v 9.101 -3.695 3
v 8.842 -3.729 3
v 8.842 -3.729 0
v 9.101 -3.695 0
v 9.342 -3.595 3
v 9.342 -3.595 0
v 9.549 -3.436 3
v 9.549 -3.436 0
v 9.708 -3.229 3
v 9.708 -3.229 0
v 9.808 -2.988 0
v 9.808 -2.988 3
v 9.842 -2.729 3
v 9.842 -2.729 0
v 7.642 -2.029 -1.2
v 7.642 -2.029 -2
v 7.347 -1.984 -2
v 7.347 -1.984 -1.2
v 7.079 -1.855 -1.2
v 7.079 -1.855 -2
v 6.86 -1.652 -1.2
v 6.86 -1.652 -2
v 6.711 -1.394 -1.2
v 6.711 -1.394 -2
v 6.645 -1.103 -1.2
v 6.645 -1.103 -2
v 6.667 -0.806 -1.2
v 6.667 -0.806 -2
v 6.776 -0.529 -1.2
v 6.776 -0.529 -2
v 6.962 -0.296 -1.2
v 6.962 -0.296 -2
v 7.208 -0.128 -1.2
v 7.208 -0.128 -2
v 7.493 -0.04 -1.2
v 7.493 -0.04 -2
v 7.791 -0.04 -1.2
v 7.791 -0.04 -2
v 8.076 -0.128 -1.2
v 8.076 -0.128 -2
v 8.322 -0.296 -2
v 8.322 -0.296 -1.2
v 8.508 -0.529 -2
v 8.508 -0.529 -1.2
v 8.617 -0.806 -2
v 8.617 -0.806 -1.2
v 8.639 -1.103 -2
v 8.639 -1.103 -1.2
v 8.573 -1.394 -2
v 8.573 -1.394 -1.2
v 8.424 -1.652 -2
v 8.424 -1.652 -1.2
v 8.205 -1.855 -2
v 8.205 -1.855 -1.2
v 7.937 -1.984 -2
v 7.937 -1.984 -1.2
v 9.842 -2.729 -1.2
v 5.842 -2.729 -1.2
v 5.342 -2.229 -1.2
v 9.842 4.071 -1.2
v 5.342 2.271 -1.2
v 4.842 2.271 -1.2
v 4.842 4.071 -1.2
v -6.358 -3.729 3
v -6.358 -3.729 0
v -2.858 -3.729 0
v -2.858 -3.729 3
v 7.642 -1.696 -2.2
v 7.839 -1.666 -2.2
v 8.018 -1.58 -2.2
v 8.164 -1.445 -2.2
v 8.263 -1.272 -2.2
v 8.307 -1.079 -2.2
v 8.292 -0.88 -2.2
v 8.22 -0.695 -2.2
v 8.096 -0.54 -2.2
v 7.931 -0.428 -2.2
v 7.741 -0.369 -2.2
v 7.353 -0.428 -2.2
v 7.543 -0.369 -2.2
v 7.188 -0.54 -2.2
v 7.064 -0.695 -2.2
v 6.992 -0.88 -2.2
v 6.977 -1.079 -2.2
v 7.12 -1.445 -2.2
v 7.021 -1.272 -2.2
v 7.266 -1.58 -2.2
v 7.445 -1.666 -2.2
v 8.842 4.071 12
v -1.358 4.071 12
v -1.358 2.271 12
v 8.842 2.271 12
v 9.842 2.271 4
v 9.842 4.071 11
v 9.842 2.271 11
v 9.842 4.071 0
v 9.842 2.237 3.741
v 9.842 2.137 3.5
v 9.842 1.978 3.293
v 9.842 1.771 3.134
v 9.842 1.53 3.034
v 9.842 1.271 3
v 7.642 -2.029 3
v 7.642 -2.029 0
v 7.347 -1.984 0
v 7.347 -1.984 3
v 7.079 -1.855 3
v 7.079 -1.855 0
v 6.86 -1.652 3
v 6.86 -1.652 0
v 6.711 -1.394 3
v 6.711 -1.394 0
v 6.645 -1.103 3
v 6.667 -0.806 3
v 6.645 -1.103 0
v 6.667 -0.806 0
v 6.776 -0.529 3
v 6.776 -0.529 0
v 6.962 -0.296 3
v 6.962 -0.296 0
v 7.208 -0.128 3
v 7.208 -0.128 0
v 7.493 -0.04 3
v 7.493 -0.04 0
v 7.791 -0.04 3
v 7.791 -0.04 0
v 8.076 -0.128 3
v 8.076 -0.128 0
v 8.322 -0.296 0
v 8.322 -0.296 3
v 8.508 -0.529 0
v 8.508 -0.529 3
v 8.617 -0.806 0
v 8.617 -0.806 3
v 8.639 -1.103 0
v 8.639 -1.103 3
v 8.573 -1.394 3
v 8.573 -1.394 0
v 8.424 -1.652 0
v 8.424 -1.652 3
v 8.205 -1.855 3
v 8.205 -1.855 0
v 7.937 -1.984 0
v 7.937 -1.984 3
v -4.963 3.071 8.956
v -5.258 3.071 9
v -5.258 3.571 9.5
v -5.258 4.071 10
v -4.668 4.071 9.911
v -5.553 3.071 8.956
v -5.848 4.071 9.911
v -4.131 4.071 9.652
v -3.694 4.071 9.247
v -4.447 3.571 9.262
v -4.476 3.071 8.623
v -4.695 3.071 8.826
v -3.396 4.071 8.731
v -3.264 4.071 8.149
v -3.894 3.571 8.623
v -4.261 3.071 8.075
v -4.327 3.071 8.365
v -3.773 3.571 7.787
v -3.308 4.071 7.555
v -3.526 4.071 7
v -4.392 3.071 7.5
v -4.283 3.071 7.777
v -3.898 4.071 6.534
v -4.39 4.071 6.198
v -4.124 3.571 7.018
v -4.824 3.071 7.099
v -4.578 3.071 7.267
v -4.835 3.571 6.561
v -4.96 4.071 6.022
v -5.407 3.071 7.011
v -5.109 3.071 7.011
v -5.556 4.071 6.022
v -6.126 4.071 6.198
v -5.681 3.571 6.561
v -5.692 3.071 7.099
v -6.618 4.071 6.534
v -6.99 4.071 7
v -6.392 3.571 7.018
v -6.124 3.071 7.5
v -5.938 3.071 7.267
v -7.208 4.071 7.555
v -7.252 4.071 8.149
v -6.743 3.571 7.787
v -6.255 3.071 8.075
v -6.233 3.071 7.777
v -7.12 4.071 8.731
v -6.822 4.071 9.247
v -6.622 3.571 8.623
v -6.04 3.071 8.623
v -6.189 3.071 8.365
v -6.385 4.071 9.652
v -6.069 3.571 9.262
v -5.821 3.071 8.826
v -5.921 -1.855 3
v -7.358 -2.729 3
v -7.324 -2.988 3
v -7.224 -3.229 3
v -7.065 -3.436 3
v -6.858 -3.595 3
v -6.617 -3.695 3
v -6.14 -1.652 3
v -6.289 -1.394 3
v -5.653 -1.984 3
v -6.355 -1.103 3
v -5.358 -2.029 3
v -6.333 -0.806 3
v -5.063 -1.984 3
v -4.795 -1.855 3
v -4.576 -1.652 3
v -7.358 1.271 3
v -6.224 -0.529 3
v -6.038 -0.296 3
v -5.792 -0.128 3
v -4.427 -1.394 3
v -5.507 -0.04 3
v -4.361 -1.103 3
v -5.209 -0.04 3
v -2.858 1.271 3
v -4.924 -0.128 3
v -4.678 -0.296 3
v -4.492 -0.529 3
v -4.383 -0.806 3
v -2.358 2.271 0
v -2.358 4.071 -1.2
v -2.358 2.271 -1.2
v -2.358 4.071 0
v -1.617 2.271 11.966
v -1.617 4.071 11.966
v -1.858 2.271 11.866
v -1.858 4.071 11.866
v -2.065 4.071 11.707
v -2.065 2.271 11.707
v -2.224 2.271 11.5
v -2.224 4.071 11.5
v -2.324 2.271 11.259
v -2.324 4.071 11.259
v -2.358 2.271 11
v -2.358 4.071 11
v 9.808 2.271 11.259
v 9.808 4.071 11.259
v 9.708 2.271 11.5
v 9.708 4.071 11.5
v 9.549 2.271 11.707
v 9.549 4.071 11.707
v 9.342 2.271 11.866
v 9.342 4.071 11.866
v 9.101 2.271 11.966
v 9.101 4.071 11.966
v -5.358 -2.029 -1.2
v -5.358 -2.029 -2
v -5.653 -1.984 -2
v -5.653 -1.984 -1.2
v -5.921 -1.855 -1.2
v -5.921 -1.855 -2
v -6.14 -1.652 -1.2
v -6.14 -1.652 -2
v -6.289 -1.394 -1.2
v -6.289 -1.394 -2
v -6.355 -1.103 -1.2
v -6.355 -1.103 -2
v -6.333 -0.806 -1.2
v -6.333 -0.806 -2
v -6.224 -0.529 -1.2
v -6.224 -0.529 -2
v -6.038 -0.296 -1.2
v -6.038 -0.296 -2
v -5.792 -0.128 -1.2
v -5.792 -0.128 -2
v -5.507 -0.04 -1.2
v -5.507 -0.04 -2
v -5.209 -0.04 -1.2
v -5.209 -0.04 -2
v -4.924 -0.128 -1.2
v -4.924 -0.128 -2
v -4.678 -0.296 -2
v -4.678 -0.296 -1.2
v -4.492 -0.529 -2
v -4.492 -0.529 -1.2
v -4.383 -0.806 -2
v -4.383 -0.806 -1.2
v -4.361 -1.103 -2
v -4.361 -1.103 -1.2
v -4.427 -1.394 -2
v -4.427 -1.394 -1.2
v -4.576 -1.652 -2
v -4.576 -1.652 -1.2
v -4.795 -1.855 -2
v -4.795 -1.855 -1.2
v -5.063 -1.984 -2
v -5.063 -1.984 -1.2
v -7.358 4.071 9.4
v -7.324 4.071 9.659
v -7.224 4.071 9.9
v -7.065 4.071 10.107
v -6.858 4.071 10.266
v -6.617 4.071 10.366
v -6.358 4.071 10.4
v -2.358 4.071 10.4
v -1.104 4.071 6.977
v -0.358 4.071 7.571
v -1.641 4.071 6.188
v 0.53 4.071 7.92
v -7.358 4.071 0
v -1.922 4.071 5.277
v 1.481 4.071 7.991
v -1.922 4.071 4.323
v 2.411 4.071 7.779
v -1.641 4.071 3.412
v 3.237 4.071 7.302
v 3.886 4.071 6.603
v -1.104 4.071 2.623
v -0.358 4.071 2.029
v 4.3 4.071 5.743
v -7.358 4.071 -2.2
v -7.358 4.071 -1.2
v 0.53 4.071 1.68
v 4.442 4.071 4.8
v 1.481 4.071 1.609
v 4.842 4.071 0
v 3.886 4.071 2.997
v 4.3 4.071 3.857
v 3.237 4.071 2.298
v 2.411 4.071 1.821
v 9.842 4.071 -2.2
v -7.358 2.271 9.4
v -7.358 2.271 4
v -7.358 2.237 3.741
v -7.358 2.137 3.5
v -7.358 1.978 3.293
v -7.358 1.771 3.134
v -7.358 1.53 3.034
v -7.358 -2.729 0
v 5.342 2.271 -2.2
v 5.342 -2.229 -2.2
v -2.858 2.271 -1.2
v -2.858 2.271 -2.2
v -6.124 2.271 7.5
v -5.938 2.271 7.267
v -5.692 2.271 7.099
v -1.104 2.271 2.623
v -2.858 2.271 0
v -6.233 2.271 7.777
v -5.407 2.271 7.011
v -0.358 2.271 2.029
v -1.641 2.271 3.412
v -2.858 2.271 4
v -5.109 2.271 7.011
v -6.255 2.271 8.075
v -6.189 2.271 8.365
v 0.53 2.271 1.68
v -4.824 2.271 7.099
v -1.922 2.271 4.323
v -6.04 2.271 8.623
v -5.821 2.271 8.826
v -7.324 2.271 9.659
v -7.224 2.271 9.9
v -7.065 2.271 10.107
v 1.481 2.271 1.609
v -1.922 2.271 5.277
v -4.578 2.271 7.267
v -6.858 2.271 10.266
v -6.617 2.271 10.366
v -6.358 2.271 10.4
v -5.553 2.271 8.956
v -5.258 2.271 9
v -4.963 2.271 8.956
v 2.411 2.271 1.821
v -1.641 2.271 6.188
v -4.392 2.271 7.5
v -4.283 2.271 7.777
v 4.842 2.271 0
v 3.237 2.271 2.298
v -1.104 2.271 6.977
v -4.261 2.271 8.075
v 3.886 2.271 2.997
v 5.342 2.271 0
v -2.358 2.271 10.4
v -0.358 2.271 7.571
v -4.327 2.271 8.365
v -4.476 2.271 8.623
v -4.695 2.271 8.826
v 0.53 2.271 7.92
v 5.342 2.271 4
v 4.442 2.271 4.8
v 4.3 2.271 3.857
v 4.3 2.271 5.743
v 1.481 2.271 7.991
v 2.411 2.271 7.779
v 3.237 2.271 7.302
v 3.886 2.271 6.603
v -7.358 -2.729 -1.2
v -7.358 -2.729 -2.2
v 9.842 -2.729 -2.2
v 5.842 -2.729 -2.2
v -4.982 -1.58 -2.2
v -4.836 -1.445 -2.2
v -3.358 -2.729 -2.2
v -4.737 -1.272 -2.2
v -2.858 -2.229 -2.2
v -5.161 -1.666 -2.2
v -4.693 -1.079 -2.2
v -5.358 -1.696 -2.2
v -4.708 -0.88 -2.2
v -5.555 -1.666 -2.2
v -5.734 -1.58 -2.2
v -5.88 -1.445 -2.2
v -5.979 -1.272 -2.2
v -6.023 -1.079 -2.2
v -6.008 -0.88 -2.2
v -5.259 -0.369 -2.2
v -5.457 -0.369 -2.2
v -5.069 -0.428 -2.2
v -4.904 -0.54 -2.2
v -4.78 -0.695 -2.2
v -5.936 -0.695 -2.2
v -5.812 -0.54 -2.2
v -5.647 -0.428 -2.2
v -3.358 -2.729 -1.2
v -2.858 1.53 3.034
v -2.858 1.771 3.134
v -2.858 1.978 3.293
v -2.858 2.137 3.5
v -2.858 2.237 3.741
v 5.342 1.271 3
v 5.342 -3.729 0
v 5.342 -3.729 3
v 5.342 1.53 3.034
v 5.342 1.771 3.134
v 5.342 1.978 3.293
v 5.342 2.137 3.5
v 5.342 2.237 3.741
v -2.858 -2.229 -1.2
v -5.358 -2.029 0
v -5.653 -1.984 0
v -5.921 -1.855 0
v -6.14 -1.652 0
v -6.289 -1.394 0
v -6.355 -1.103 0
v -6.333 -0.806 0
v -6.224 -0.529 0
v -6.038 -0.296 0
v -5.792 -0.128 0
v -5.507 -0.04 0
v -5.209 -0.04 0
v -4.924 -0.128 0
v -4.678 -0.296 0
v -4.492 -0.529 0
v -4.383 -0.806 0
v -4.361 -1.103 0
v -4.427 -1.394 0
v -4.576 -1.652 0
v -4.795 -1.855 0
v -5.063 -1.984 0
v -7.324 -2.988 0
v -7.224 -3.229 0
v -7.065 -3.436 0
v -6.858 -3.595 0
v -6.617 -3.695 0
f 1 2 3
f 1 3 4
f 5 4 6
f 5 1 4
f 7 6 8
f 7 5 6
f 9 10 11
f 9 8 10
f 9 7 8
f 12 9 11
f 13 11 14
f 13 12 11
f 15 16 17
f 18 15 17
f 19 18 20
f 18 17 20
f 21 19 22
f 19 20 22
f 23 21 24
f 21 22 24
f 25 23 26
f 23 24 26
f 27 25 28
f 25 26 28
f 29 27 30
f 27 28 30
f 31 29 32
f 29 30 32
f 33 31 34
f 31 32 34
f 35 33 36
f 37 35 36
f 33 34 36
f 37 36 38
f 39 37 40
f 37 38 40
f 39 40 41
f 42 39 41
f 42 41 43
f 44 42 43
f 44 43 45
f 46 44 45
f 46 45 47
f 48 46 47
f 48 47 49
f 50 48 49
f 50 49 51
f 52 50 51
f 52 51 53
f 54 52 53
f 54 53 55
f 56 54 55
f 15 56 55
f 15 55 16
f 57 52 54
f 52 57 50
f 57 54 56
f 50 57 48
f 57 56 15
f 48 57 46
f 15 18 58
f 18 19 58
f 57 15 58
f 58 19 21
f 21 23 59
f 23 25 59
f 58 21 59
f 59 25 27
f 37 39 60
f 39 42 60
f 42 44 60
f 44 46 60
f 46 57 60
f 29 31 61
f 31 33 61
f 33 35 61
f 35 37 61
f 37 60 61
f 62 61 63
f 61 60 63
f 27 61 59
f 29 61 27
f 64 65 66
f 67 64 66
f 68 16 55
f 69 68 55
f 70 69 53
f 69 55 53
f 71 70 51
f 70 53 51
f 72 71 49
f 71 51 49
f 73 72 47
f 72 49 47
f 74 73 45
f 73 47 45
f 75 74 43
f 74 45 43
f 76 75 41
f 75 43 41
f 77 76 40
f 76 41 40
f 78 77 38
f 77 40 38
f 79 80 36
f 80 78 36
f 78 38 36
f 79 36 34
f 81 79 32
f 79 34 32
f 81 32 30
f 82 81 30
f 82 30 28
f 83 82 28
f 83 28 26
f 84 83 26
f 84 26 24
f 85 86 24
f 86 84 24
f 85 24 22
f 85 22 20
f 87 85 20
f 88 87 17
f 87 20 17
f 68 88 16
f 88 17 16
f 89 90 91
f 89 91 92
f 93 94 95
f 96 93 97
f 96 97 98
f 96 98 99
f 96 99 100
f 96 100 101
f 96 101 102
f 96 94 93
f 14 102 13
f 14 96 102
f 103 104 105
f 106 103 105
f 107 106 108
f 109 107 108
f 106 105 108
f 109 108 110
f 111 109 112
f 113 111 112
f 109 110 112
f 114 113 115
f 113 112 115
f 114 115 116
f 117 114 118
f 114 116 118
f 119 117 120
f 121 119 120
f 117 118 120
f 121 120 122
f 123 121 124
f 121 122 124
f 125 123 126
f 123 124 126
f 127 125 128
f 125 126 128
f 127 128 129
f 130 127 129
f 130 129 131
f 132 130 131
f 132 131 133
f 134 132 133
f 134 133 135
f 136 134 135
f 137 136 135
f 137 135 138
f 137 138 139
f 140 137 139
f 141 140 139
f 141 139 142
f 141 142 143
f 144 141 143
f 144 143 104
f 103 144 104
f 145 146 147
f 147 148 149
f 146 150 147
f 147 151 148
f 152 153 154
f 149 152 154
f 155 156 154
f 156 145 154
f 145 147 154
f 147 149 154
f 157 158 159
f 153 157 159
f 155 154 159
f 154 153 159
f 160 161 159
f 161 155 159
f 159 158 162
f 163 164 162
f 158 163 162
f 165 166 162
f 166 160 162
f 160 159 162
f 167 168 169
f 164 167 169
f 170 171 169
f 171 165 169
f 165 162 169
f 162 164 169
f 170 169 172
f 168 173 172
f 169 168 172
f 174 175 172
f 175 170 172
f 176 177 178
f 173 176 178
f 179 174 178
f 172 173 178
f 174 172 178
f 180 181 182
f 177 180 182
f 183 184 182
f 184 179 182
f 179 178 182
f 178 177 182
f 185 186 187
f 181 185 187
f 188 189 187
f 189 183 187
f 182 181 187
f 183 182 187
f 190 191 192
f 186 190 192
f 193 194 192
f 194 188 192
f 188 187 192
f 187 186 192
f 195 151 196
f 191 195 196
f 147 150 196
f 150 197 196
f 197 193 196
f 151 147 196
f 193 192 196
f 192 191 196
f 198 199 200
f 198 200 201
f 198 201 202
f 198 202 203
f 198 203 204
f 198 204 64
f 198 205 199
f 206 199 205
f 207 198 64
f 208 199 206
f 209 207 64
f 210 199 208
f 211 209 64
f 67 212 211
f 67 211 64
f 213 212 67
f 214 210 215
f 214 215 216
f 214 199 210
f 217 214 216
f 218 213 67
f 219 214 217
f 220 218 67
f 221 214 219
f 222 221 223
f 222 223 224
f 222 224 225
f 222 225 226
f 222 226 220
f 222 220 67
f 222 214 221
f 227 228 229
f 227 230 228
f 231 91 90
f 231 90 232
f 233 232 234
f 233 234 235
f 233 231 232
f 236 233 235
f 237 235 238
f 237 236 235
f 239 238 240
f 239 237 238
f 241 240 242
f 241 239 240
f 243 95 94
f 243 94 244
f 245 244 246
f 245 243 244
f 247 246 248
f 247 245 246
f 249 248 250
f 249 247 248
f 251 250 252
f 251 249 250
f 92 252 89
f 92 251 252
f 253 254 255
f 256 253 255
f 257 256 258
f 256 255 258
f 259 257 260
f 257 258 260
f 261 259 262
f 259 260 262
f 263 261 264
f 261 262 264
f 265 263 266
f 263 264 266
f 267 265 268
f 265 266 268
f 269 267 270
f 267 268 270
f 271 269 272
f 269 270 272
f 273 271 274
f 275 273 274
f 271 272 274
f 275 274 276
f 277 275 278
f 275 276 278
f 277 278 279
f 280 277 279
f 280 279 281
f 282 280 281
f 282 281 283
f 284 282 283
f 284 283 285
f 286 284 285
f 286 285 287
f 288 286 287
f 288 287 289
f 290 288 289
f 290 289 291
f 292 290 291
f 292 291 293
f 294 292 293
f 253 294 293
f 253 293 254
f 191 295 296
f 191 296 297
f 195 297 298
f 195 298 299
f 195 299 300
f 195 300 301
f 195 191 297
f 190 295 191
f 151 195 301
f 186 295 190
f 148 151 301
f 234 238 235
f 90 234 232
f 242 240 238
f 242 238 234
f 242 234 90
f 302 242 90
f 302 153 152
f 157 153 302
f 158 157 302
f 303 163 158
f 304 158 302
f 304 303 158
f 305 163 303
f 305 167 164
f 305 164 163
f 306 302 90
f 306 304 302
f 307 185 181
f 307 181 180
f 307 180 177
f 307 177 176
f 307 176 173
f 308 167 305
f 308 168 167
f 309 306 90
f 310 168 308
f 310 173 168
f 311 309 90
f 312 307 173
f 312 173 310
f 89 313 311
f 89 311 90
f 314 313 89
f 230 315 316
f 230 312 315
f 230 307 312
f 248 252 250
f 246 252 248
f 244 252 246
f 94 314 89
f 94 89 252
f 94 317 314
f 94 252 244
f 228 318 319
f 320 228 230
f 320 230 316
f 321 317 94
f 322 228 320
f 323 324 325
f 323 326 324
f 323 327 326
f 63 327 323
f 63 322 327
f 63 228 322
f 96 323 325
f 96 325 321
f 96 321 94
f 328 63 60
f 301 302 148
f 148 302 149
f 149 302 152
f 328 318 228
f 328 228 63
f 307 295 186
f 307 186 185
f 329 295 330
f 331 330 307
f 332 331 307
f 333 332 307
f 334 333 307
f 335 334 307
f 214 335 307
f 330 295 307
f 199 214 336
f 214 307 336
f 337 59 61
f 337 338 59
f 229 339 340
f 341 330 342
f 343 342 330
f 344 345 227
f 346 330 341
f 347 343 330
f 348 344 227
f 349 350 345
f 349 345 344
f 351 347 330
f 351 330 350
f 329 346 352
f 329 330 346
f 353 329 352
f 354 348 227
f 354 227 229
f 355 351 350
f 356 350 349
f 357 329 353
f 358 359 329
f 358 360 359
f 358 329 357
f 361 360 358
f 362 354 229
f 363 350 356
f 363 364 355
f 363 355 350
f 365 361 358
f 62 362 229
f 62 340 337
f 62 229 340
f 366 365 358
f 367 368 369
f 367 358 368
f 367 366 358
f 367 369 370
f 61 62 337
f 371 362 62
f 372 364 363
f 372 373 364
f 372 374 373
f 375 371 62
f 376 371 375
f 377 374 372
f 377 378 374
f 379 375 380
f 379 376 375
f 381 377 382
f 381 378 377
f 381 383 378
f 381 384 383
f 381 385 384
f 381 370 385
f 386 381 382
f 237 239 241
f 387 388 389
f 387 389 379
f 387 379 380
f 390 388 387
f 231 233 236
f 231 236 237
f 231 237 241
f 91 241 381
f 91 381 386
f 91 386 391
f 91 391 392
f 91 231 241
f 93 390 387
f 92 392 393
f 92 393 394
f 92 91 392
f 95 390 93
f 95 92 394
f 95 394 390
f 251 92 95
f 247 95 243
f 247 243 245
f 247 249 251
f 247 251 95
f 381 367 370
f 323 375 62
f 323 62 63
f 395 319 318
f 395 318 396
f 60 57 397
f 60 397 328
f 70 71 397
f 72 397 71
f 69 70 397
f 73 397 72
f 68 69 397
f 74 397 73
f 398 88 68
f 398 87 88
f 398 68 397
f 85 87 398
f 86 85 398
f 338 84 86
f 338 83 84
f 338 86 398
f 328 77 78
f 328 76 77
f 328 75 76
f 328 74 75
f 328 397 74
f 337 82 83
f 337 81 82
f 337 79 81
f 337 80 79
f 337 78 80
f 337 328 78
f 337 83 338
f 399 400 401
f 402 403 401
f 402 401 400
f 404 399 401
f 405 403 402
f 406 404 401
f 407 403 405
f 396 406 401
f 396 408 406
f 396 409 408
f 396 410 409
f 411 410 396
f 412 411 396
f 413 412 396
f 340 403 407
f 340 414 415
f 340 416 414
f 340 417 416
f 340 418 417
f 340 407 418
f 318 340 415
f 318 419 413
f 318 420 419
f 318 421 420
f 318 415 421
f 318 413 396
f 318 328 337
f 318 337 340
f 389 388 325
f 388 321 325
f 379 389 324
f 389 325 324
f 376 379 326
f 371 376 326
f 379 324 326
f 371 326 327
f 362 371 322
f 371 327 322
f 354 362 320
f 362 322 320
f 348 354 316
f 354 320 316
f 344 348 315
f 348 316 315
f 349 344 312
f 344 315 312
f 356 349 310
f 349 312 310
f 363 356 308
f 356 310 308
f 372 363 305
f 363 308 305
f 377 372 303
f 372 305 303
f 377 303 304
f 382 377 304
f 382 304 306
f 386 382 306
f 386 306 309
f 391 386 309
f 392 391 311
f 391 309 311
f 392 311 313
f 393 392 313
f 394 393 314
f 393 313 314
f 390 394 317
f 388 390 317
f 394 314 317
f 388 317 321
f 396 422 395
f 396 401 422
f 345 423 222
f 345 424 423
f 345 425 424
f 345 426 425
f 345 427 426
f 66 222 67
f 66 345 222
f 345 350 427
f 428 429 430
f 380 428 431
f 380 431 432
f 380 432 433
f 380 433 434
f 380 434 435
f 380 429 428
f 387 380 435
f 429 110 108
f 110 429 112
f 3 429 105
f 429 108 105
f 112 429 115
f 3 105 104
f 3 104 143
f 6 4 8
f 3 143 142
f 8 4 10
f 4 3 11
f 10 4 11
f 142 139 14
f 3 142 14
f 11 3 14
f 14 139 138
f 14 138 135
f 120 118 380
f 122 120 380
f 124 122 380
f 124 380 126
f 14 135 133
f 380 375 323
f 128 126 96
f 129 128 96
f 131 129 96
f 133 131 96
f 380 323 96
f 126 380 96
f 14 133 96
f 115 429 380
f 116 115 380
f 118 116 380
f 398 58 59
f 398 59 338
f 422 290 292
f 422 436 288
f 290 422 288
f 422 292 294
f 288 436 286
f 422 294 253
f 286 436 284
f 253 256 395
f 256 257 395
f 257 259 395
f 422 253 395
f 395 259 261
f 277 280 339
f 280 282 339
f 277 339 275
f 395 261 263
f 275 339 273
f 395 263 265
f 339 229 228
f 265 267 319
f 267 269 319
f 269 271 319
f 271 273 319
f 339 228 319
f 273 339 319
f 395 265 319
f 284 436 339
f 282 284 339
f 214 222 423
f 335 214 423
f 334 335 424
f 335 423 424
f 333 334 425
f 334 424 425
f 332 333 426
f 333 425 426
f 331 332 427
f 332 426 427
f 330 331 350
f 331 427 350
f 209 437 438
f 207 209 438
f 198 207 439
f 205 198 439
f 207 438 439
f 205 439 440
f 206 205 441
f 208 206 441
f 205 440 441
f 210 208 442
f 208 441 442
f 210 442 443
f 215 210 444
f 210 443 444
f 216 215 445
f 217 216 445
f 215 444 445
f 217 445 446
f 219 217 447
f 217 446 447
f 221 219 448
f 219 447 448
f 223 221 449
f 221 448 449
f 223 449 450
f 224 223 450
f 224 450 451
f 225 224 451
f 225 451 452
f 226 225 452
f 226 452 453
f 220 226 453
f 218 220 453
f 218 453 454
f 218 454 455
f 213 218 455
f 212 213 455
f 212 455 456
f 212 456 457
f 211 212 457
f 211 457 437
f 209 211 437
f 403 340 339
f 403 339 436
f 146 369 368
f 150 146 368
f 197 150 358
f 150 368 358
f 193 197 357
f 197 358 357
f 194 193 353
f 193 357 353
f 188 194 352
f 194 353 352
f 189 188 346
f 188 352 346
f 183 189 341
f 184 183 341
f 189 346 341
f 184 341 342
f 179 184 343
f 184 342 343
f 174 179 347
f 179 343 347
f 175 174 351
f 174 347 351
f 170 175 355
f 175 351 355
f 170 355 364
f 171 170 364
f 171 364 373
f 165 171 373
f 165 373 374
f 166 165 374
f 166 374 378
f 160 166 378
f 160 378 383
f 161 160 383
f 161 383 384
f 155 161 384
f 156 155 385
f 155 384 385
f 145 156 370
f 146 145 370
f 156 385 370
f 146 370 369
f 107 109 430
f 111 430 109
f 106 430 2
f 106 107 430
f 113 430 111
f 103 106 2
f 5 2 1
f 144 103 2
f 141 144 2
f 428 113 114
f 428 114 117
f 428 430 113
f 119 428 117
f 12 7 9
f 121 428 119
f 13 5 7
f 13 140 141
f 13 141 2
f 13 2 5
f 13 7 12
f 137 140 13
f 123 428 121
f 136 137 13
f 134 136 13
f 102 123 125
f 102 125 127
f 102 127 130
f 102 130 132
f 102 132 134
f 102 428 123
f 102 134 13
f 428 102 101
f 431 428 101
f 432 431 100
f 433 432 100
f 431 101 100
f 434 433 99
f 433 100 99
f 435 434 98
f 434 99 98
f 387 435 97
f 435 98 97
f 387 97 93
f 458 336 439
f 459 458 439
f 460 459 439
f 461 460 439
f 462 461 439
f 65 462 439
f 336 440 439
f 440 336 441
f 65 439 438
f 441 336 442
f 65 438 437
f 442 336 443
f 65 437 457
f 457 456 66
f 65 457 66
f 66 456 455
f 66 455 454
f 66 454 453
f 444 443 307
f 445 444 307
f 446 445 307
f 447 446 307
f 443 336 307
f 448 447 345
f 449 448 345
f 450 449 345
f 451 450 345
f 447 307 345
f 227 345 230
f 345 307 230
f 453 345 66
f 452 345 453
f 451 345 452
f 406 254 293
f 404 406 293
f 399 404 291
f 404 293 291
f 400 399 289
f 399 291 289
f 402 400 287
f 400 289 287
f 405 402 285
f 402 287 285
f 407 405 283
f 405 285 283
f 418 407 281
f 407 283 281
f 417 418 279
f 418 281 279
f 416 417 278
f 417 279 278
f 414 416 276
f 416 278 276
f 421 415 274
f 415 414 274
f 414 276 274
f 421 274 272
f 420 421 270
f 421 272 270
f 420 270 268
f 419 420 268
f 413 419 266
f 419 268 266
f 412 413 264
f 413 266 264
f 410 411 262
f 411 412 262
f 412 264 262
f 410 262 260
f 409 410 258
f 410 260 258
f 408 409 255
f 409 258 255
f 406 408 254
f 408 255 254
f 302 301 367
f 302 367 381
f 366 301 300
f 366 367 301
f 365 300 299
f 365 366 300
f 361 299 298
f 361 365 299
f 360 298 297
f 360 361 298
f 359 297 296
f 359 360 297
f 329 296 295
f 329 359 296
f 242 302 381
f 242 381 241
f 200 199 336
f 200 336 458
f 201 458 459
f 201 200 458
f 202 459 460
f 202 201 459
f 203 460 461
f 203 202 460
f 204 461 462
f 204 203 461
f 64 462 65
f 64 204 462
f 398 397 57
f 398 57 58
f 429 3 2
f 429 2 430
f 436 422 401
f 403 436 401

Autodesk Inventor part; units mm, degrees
ref_plane "YZ Plane" through (0, 0, 0) normal (1, 0, 0) x (0, 1, 0)
ref_plane "XZ Plane" through (0, 0, 0) normal (0, 1, 0) x (-1, 0, 0)
ref_plane "XY Plane" through (0, 0, 0) normal (0, 0, 1) x (1, 0, 0)
sketch "Sketch1" plane through (0, 0, 0) normal (0, 0, 1) x (1, 0, 0)
  line L0 (-2.358, 4.2713) -> (4.842, 4.2713)
  line L1 (4.842, 4.2713) -> (4.842, 2.2713)
  line L2 (4.842, 2.2713) -> (-2.358, 2.2713)
  line L3 (-2.358, 2.2713) -> (-2.358, 4.2713)
  line L4 (-2.358, 4.2713) -> (-7.358, 4.2713)
  line L5 (-7.358, 4.2713) -> (-7.358, -3.7287)
  line L6 (-7.358, -3.7287) -> (-2.358, -3.7287)
  line L7 (-2.358, -3.7287) -> (-2.358, 4.2713)
  line L8 (4.842, 4.2713) -> (9.842, 4.2713)
  line L9 (9.842, 4.2713) -> (9.842, -3.7287)
  line L10 (9.842, -3.7287) -> (4.842, -3.7287)
  line L11 (4.842, -3.7287) -> (4.842, 4.2713)
  point P0 (0, 0)
  point P1 (-2.358, 2.2713)
  point P2 (4.842, 2.2713)
  point P3 (-2.358, 2.2713)
  dimension "d0" = 7.2
  dimension "d1" = 2
  dimension "d2" = 8
  dimension "d3" = 5
  dimension "d4" = 5
extrude "Extrusion1" add sketch "Sketch1" along normal blind 12
sketch "Sketch2" plane through (0, 0, 0) normal (0, 0, -1) x (-1, 0, 0)
  line L0 (2.358, 2.2713) -> (-4.842, 2.2713) projected
  line L1 (-9.842, 4.2713) -> (7.358, 4.2713) projected
  line L2 (2.358, 2.2713) -> (-4.842, 2.2713)
  line L3 (-4.842, 2.2713) -> (-4.842, 4.2713)
  line L4 (-4.842, 4.2713) -> (2.358, 4.2713)
  line L5 (2.358, 4.2713) -> (2.358, 2.2713)
  line L6 (-4.842, 2.2713) -> (-4.842, -3.7287) projected
  point P0 (0, 0)
  point P1 (-4.842, 2.2713)
extrude "Extrusion2" add sketch "Sketch2" along normal blind 1.2
sketch "Sketch3" plane through (0, 0, -1.2) normal (0, 0, -1) x (-1, 0, 0)
  line L0 (-9.842, -3.7287) -> (-9.842, 4.2713) projected
  line L1 (7.358, 4.2713) -> (7.358, -3.7287) projected
  line L2 (-9.842, 4.2713) -> (7.358, 4.2713)
  line L3 (7.358, 4.2713) -> (7.358, -3.7287)
  line L4 (7.358, -3.7287) -> (-9.842, -3.7287)
  line L5 (-9.842, -3.7287) -> (-9.842, 4.2713)
  point P0 (0, 0)
extrude "Extrusion3" add sketch "Sketch3" along normal blind 1
sketch "Sketch4" plane through (0, 0, 12) normal (0, 0, 1) x (1, 0, 0)
  line L0 (-7.358, -3.7287) -> (-7.358, 4.2713) projected
  line L1 (9.842, 4.2713) -> (9.842, -3.7287) projected
  line L2 (-7.358, 2.2713) -> (9.842, 2.2713)
  line L3 (9.842, 2.2713) -> (9.842, -3.7287)
  line L4 (9.842, -3.7287) -> (-7.358, -3.7287)
  line L5 (-7.358, -3.7287) -> (-7.358, 2.2713)
  line L6 (-2.358, 2.2713) -> (4.842, 2.2713) projected
  point P0 (0, 0)
extrude "Extrusion4" cut sketch "Sketch4" against normal blind 9
sketch "Sketch5" plane through (0, 0, 3) normal (0, 0, 1) x (1, 0, 0)
  line L0 (9.842, 4.2713) -> (-7.358, 4.2713) projected
  line L1 (-2.358, 2.2713) -> (-2.358, -3.7287) projected
  line L2 (4.842, -3.7287) -> (4.842, 2.2713) projected
  point P0 (0, 0)
  point P1 (-5.358, -1.0287)
  point P2 (7.642, -1.0287)
  dimension "d13" = 5.3
  dimension "d14" = 3
  dimension "d15" = 5.3
  dimension "d16" = 2.8
hole "Hole1" at (-5.358, -1.0287, 3) at (7.642, -1.0287, 3) direction (0, 0, -1) diameter 2 depth 5 tip angle 118
sketch "Sketch6" plane through (0, 0, -1.2) normal (0, 0, 1) x (1, 0, 0)
  line L0 (-2.358, 2.2713) -> (-2.358, -3.7287) projected
  line L1 (4.842, 2.2713) -> (4.842, -3.7287) projected
  line L2 (-2.358, 2.2713) -> (4.842, 2.2713)
  line L3 (4.842, 2.2713) -> (4.842, -3.7287)
  line L4 (4.842, -3.7287) -> (-2.358, -3.7287)
  line L5 (-2.358, -3.7287) -> (-2.358, 2.2713)
  point P0 (0, 0)
  point P1 (4.842, 2.2713)
extrude "Extrusion5" cut sketch "Sketch6" against normal blind 2
sketch "Sketch7" plane through (-7.358, 4.2713, 12) normal (0, 1, 0) x (1, 0, 0)
  line L0 (0, 14.2) -> (17.2, 14.2) projected
  line L1 (17.2, 12) -> (17.2, 0) projected
  line L2 (0, 14.2) -> (17.2, 14.2)
  line L3 (17.2, 14.2) -> (17.2, 0)
  line L4 (17.2, 0) -> (0, 0)
  line L5 (0, 0) -> (0, 14.2)
  point P0 (7.358, 12)
extrude "Extrusion6" cut sketch "Sketch7" against normal blind 0.2
sketch "Sketch8" plane through (-7.358, 4.0713, 12) normal (0, 1, 0) x (1, 0, 0)
  line L0 (0, 14.2) -> (17.2, 14.2) projected
  circle A0 centre (8.6, 7.2) radius 3.2
  point P0 (7.358, 12)
  dimension "d31" = 7
  dimension "d32" = 6.4
extrude "Extrusion7" cut sketch "Sketch8" against normal blind 2
sketch "Sketch9" plane through (-7.358, 4.0713, 12) normal (0, 1, 0) x (1, 0, 0)
  line L0 (0, 9) -> (0, 0) projected
  line L1 (0, 0) -> (17.2, 0) projected
  line L2 (0, 1.6) -> (5, 1.6)
  line L3 (5, 1.6) -> (5, 0)
  line L4 (5, 0) -> (0, 0)
  line L5 (0, 0) -> (0, 1.6)
  point P0 (7.358, 12)
  dimension "d35" = 1.6
  dimension "d36" = 5
extrude "Extrusion8" cut sketch "Sketch9" against normal blind 2
fillet "Fillet1" radius 1 2 edges at (-4.858, 2.2713, 3) (7.342, 2.2713, 3)
fillet "Fillet2" radius 1 3 edges at (-7.358, 3.1713, 10.4) (9.842, 3.1713, 12) (-2.358, 3.1713, 12)
sketch "Sketch10" plane through (0, 0, -2.2) normal (0, 0, -1) x (-1, 0, 0)
  line L0 (7.358, -3.7287) -> (2.358, -3.7287) projected
  line L1 (-9.842, 4.0713) -> (-9.842, -3.7287) projected
  line L2 (7.358, -3.7287) -> (-9.842, -3.7287)
  line L3 (-9.842, -3.7287) -> (-9.842, -2.7287)
  line L4 (-9.842, -2.7287) -> (7.358, -2.7287)
  line L5 (7.358, -2.7287) -> (7.358, -3.7287)
  point P0 (0, 0)
  point P1 (-9.842, -3.7287)
  point P2 (2.358, -3.7287)
  dimension "d45" = 1
extrude "Extrusion9" cut sketch "Sketch10" against normal blind 1
fillet "Fillet4" radius 1 2 edges at (-7.358, -3.7287, 1.5) (9.842, -3.7287, 1.5)
chamfer "Chamfer3" distance 1 angle 45 2 edges at (-2.358, -2.7287, -1.7) (4.842, -2.7287, -1.7)
sketch "Sketch11" plane through (0, 0, -2.2) normal (0, 0, -1) x (-1, 0, 0)
  line L0 (-9.842, 2.2713) -> (-4.842, 2.2713) projected
  line L1 (-5.342, 2.2713) -> (2.858, 2.2713)
  line L2 (2.858, 2.2713) -> (2.858, -3.7287)
  line L3 (2.858, -3.7287) -> (-5.342, -3.7287)
  line L4 (-5.342, -3.7287) -> (-5.342, 2.2713)
  line L5 (-4.842, -1.7287) -> (-4.842, 2.2713) projected
  line L6 (2.358, 2.2713) -> (2.358, -1.7287) projected
  line L7 (-4.842, -3.7287) -> (-8.842, -3.7287) projected
  point P0 (0, 0)
  dimension "d52" = 8.2
  dimension "d53" = 0.5
  dimension "d54" = 0.5
extrude "Extrusion10" cut sketch "Sketch11" against normal blind 10
sketch "Sketch12" plane through (-7.358, 4.0713, 12) normal (0, 1, 0) x (1, 0, 0)
  line L0 (0, 2.6) -> (0, 12) projected
  line L1 (1, 1.6) -> (5, 1.6) projected
  point P0 (7.358, 12)
  point P1 (2.1, 4)
  dimension "d57" = 2.1
  dimension "d58" = 2.4
hole "Hole2" at (-5.258, 4.0713, 8) direction (0, -1, 0) diameter 2 depth 5 tip angle 118 countersink diameter 4 countersink angle 90
properties part number "switch-mount"
